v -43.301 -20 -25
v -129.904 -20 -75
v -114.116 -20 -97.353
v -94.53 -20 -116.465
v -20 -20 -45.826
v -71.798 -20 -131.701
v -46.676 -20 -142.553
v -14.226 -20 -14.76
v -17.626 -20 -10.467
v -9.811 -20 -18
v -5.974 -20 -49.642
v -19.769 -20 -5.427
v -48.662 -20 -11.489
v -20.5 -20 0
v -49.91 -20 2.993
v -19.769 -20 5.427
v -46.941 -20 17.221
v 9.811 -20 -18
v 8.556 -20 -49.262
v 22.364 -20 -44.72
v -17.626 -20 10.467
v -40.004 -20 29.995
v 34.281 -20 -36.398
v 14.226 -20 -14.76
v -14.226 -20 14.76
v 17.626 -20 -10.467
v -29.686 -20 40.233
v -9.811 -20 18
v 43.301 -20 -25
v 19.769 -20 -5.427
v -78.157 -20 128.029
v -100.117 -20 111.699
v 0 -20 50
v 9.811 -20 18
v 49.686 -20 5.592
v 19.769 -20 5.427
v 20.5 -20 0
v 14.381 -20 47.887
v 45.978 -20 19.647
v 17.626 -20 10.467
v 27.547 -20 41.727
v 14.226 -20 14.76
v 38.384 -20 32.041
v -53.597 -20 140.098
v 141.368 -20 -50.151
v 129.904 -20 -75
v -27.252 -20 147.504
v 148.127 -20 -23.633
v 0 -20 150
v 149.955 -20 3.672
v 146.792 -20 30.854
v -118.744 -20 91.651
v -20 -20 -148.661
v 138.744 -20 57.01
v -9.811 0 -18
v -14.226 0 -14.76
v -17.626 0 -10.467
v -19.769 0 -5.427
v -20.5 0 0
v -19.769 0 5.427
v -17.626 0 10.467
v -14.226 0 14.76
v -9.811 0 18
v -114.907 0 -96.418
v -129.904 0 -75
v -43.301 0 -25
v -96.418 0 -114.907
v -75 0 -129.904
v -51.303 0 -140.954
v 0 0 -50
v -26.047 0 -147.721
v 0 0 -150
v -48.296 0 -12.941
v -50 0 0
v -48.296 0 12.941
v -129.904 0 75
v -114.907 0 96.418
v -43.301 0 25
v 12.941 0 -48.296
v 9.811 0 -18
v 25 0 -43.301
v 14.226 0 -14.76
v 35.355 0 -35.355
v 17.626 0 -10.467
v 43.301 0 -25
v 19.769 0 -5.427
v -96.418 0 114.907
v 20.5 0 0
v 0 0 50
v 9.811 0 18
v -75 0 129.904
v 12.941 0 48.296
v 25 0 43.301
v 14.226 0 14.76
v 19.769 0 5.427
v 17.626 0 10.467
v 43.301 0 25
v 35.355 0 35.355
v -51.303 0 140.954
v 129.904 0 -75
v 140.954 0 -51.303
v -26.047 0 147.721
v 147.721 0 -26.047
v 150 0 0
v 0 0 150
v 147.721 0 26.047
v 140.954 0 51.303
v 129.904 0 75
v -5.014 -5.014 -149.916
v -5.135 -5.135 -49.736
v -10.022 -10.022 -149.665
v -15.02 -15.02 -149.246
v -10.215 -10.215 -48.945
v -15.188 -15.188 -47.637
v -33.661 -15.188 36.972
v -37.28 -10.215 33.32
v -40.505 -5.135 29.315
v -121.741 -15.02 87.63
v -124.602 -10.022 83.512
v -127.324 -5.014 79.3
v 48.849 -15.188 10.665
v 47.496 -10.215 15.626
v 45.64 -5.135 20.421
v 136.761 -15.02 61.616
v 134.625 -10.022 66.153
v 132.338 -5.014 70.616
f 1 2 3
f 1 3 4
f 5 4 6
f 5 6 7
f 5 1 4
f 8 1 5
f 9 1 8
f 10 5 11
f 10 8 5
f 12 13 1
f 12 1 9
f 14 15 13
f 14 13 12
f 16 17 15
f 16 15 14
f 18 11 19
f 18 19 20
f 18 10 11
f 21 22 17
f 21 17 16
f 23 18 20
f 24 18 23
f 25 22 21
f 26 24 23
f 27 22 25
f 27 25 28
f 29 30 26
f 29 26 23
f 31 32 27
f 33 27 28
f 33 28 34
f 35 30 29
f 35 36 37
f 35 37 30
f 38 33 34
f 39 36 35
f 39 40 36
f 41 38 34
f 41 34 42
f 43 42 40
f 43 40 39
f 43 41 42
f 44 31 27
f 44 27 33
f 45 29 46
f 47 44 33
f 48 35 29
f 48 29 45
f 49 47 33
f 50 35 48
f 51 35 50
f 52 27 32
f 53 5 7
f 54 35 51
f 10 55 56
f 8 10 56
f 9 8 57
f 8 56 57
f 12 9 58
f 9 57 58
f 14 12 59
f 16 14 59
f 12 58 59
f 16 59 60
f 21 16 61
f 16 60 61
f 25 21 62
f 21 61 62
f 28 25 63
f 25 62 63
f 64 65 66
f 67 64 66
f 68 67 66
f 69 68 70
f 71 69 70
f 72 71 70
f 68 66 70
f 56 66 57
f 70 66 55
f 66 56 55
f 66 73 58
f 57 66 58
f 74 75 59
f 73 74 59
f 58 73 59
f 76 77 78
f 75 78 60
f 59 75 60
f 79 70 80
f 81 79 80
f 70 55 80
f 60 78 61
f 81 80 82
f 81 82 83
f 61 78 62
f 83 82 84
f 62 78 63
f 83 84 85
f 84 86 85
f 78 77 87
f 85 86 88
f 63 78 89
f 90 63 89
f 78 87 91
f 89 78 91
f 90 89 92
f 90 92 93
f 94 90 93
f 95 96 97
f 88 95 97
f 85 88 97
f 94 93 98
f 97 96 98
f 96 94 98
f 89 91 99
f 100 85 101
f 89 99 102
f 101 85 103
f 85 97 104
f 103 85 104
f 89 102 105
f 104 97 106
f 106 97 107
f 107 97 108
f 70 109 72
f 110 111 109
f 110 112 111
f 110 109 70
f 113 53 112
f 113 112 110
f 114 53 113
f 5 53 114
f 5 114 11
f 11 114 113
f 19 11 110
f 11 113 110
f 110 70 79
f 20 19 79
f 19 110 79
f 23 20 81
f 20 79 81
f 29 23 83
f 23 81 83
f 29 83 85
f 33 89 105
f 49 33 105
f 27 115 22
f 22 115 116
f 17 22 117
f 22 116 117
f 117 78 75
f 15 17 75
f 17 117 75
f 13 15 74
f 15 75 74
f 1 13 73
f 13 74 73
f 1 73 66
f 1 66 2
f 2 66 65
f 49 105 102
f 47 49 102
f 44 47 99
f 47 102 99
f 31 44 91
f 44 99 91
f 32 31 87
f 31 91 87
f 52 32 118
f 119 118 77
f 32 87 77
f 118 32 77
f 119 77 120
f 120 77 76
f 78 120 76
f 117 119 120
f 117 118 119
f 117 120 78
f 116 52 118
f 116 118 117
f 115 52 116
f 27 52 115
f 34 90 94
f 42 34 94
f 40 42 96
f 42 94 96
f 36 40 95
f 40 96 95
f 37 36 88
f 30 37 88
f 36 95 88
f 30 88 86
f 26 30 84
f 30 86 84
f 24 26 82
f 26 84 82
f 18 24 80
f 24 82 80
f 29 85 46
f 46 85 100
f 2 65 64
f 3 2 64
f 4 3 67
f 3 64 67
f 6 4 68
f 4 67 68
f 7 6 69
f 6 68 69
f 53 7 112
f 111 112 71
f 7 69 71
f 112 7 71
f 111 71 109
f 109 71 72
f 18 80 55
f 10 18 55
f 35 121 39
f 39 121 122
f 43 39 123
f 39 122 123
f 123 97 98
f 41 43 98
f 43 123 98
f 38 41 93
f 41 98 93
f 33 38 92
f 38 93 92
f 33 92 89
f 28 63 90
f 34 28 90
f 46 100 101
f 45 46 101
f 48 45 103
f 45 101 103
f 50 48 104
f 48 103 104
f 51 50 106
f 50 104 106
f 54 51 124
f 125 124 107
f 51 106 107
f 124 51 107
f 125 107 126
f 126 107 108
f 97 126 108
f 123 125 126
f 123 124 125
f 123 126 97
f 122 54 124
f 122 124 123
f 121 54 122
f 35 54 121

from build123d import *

# Parameters (mm, degrees)
F1_DEPTH = 20
F2_SIZE  = 19.99999


# Not quite as in the source:
# - a fillet or chamfer is up to 0.001 mm smaller than in the source, because OpenCascade refuses the exact size


with BuildPart() as f1:
    # F0 (on Front) → F1 (new body)
    with BuildSketch(Plane.XZ):
        with BuildLine():
            Line((-129.9038105677, 75), (-43.3012701892, 25))
            ThreePointArc((-43.3012701892, 25), (-50, 0), (-43.3012701892, -25))
            Line((-43.3012701892, -25), (-129.9038105677, -75))
            ThreePointArc((-129.9038105677, -75), (-75, -129.9038105677), (0, -150))
            Line((0, -150), (0, -50))
            ThreePointArc((0, -50), (25, -43.3012701892), (43.3012701892, -25))
            Line((43.3012701892, -25), (129.9038105677, -75))
            ThreePointArc((129.9038105677, -75), (150, 0), (129.9038105677, 75))
            Line((129.9038105677, 75), (43.3012701892, 25))
            ThreePointArc((43.3012701892, 25), (25, 43.3012701892), (0, 50))
            Line((0, 50), (0, 150))
            ThreePointArc((0, 150), (-75, 129.9038105677), (-129.9038105677, 75))
        make_face()
        with BuildLine():
            ThreePointArc((-9.8107084352, -18), (-20.5, 0), (-9.8107084352, 18))
            Line((-9.8107084352, 18), (9.8107084352, 18))
            ThreePointArc((9.8107084352, 18), (20.5, 0), (9.8107084352, -18))
            Line((9.8107084352, -18), (-9.8107084352, -18))
        make_face(mode=Mode.SUBTRACT)
    extrude(amount=F1_DEPTH)

    # F2 (size 20 in the source; OpenCascade refuses exactly that, so slightly less here)
    f2_edges = [f1.edges().sort_by_distance(p)[0] for p in [
        (-86.60254, -20, 50),
        (0, -20, -100),
        (86.60254, -20, 50),
    ]]
    chamfer(f2_edges, length=F2_SIZE)


solid = f1.part
